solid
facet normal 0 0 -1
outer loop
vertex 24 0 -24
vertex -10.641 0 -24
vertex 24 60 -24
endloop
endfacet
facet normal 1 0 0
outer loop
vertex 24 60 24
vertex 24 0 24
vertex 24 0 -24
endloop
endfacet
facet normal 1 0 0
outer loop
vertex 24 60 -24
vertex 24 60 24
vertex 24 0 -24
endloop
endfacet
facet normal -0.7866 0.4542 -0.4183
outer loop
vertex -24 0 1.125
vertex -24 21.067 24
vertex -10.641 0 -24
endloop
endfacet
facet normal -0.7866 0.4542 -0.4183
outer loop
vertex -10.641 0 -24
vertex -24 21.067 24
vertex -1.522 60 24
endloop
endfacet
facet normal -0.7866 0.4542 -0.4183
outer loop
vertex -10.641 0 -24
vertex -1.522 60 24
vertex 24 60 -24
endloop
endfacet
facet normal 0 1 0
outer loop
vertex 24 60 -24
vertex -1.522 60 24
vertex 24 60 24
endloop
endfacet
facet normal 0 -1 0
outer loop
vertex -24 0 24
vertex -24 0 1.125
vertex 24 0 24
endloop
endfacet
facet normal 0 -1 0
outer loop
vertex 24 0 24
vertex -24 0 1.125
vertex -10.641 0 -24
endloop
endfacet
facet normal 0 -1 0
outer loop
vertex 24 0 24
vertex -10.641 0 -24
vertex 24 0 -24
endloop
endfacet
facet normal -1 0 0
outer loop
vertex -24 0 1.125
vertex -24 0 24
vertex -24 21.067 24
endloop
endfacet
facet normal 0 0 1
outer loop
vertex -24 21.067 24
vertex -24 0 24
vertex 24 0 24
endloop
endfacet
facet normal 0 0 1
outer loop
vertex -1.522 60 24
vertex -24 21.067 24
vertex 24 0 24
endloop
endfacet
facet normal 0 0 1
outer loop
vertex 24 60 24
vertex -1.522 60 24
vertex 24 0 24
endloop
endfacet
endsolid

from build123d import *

# Parameters (mm, degrees)
SKETCH_1_W      = 48
SKETCH_1_H      = 48
EXTRUDE_1_DEPTH = 60


with BuildPart() as part:
    # 草图1 → 凸台-拉伸1 (new body)
    with BuildSketch(Plane(origin=(0, 0, 0), x_dir=(1, 0, 0), z_dir=(0, 1, 0))):
        Rectangle(SKETCH_1_W, SKETCH_1_H)
    extrude(amount=EXTRUDE_1_DEPTH)

    # Surface Cut 1
    split(bisect_by=Plane(origin=(-14.481029553, 8.36062631, -7.699699993), x_dir=(0.3622245100921348, -0.20913041840877658, -0.9083269633698446), z_dir=(0.7866342252206607, -0.45416348168492593, 0.41826083681754983)), keep=Keep.TOP)


solid = part.part
